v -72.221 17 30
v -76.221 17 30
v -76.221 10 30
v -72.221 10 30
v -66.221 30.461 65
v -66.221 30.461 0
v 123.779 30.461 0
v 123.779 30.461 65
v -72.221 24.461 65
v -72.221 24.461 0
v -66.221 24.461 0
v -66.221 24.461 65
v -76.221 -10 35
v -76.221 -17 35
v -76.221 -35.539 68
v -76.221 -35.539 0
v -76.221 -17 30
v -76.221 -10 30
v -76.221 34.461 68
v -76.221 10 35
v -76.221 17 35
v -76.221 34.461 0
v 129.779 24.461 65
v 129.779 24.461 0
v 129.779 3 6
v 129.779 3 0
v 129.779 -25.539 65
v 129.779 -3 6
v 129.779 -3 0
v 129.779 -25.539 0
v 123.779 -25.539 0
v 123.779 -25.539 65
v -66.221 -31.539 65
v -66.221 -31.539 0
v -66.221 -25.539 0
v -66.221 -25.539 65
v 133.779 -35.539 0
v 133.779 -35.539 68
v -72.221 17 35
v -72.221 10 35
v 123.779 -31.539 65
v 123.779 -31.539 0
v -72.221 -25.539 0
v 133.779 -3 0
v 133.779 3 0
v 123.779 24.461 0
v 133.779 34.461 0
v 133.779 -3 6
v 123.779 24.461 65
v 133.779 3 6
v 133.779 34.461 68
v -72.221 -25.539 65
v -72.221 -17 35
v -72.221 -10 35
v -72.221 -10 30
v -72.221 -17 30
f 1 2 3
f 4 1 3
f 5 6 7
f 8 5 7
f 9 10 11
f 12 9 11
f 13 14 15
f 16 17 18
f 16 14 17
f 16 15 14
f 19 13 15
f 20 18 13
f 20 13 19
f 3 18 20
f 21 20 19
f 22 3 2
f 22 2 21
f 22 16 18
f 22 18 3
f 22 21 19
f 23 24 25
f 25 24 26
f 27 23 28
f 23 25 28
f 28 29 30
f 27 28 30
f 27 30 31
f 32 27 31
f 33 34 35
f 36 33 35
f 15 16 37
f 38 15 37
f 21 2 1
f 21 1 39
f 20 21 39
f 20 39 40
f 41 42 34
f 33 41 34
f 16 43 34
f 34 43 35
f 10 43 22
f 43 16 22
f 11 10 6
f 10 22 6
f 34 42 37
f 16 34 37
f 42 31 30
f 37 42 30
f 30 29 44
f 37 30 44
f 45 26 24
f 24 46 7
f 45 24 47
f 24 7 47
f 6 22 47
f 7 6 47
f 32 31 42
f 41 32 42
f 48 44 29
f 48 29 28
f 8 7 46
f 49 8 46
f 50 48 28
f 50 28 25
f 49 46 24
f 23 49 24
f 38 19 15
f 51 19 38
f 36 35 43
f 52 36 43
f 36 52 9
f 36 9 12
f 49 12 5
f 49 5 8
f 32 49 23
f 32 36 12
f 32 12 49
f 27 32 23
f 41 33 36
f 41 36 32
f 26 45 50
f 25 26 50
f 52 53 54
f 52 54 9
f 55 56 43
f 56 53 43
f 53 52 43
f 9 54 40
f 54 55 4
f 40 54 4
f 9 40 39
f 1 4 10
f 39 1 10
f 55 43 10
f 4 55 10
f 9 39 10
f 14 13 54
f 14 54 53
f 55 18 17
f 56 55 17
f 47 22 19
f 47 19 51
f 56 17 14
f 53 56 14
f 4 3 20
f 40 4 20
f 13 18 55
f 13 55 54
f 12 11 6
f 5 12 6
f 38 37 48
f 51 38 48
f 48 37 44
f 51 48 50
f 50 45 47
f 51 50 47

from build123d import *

# Parameters (mm, degrees)
SKETCH006_W     = 210
SKETCH006_H     = 70
PAD002_DEPTH    = 68
POCKET_DEPTH    = 65
SKETCH_W        = 7
SKETCH_H        = 5
POCKET001_DEPTH = 20
SKETCH008_W     = 6
SKETCH008_H     = 6
POCKET002_DEPTH = 10


with BuildPart() as part:
    # Sketch006 → Pad002 (new body)
    with BuildSketch(Plane.XY):
        with Locations((28.778721, -0.538714)):
            Rectangle(SKETCH006_W, SKETCH006_H)
    extrude(amount=PAD002_DEPTH)

    # Sketch007 (on Face5 of Pad002) → Pocket (cut)
    with BuildSketch(Plane(origin=(0, 0, 0), x_dir=(1, 0, 0), z_dir=(0, 0, -1))):
        Polygon((-66.221279, 31.538714), (-66.221279, 25.538714), (-72.221279, 25.538714), (-72.221279, -24.461286), (-66.221279, -24.461286), (-66.221279, -30.461286), (123.778721, -30.461286), (123.778721, -24.461286), (129.778721, -24.461286), (129.778721, 25.538714), (123.778721, 25.538714), (123.778721, 31.538714), align=None)
    extrude(amount=-POCKET_DEPTH, mode=Mode.SUBTRACT)

    # Sketch (on Face4 of Pad002) → Pocket001 (cut)
    with BuildSketch(Plane(origin=(-76.221279, 0, 0), x_dir=(0, -1, 0), z_dir=(-1, 0, 0))):
        with Locations((-13.5, 32.5)):
            Rectangle(SKETCH_W, SKETCH_H)
        with Locations((13.5, 32.5)):
            Rectangle(SKETCH_W, SKETCH_H)
    extrude(amount=-POCKET001_DEPTH, mode=Mode.SUBTRACT)

    # Sketch008 (on Face2 of Pad002) → Pocket002 (cut)
    with BuildSketch(Plane.YZ.offset(133.778721)):
        with Locations((0, 3)):
            Rectangle(SKETCH008_W, SKETCH008_H)
    extrude(amount=-POCKET002_DEPTH, mode=Mode.SUBTRACT)


solid = part.part
